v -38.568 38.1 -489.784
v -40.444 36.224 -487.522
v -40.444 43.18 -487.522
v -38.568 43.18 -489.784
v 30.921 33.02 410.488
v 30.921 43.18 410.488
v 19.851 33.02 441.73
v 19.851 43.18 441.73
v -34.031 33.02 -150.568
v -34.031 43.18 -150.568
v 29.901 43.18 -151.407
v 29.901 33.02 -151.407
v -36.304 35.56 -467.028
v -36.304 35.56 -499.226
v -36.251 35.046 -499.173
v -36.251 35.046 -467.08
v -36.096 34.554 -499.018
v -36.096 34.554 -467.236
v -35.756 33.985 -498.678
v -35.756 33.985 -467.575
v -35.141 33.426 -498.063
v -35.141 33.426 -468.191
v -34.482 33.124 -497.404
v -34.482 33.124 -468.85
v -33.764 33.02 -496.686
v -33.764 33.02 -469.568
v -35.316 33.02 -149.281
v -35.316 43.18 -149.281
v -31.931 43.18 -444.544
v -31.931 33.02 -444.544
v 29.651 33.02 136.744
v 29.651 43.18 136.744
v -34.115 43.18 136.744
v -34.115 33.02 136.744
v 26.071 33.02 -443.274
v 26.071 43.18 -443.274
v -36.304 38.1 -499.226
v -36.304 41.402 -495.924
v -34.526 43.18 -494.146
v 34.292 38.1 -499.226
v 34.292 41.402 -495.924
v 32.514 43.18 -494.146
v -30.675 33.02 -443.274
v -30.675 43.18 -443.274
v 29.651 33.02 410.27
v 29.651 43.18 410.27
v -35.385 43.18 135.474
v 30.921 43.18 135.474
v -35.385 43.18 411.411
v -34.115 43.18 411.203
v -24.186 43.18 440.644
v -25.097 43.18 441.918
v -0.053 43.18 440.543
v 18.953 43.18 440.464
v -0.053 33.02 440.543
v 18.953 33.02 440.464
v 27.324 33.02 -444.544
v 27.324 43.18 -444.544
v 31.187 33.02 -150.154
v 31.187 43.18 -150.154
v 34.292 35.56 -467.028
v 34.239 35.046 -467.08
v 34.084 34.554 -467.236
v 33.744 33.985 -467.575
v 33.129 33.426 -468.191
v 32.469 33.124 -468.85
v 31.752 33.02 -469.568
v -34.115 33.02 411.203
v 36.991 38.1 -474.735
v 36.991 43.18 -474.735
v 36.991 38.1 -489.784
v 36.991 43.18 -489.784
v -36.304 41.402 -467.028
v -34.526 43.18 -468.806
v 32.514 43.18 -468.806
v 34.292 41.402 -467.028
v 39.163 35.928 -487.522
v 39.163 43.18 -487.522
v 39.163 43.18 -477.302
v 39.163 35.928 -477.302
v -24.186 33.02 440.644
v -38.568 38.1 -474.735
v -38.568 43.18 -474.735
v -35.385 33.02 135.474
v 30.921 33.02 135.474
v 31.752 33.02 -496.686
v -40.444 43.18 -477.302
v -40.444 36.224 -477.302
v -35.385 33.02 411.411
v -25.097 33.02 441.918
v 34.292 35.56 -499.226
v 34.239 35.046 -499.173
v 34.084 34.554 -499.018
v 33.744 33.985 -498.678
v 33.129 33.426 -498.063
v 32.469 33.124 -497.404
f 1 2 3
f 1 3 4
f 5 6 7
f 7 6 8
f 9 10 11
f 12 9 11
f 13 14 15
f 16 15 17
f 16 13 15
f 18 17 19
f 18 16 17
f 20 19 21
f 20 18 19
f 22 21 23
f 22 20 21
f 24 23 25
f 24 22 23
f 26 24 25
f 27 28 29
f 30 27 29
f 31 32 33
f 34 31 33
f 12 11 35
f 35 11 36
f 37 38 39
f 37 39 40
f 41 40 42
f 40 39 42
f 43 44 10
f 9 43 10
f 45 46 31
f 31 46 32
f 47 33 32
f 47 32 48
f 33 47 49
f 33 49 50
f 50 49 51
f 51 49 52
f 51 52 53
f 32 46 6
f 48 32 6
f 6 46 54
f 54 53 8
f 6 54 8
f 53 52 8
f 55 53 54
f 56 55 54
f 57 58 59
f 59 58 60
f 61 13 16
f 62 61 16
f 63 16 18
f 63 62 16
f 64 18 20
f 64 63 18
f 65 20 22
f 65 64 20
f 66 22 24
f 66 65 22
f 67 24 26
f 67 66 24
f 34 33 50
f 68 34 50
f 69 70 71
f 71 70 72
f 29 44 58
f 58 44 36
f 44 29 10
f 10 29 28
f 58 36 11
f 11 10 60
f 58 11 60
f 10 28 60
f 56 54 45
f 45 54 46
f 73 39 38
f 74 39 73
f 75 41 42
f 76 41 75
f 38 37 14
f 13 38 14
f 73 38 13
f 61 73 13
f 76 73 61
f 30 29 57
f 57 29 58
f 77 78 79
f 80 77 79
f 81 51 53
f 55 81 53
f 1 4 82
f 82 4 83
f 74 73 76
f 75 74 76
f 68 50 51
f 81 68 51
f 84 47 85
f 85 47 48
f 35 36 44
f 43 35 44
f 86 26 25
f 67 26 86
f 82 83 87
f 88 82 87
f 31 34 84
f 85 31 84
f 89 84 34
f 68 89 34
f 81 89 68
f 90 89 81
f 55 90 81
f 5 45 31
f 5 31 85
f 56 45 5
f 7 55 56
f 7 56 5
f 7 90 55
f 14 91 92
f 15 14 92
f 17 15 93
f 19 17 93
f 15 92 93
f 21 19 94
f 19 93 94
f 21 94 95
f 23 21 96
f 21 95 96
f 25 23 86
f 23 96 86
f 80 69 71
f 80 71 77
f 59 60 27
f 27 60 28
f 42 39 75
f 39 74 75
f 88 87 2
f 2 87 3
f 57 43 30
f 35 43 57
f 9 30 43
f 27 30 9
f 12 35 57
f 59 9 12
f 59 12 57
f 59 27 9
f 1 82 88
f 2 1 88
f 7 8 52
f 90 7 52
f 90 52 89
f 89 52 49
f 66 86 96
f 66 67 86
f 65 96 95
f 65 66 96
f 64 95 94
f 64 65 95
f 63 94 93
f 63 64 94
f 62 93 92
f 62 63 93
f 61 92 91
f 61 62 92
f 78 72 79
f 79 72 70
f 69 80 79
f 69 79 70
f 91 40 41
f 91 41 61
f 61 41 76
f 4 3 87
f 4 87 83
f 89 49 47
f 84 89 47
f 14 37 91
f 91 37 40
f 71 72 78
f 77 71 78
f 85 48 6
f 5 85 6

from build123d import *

# Parameters (mm, degrees)
F3_DEPTH       = 10.16
F5_DEPTH       = 10.16
F6_DEPTH       = 3.048
F7_W           = 70.5953985453
F7_H           = 32.1978032589
F8_DEPTH       = 10.16
F9_SIZE        = 5.08
F10_SIZE       = 1.778
F11_R          = 2.54
F12_T1_DEPTH   = 41.1774884869
F12_2_T1_DEPTH = 41.1774884869


# Not quite as in the source:
# - a fillet or chamfer that OpenCascade refuses, or shapes differently, is made with other operations: its cross-section is extruded or revolved along the edge and cut away or added


with BuildPart() as f3:
    # F2 (on offset) → F3 (new body)
    with BuildSketch(Plane.XZ.offset(-43.18)):
        Polygon((-35.3846980661, 135.4740036093), (30.9212480387, 135.4740036093), (30.9212480387, 410.4879885195), (19.851437657, 441.7302218888), (-0.0477681745, 441.8133852342), (-25.0969552653, 441.9180715325), (-35.3846980661, 411.4112124139), align=None)
        Polygon((29.6512480387, 410.2696444457), (29.6512480387, 136.7440036093), (-34.1146980661, 136.7440036093), (-34.1146980661, 411.2028378599), (-24.1862514864, 440.6442544017), (-0.0530757494, 440.5433963249), (18.9527356185, 440.46396668), align=None, mode=Mode.SUBTRACT)
    extrude(amount=F3_DEPTH)

    # F2 (on offset) → F6 (join)
    with BuildSketch(Plane.XZ.offset(-43.18)):
        Polygon((-35.3846980661, 135.4740036093), (30.9212480387, 135.4740036093), (30.9212480387, 410.4879885195), (19.851437657, 441.7302218888), (-0.0477681745, 441.8133852342), (-25.0969552653, 441.9180715325), (-35.3846980661, 411.4112124139), align=None)
        Polygon((29.6512480387, 410.2696444457), (29.6512480387, 136.7440036093), (-34.1146980661, 136.7440036093), (-34.1146980661, 411.2028378599), (-24.1862514864, 440.6442544017), (-0.0530757494, 440.5433963249), (18.9527356185, 440.46396668), align=None, mode=Mode.SUBTRACT)
    extrude(amount=F6_DEPTH)


with BuildPart() as f5:
    # F4 (on offset) → F5 (new body)
    with BuildSketch(Plane.XZ.offset(-43.18)):
        Polygon((27.3243936069, -444.5440577507), (31.1871017119, -150.1536065675), (-35.3159089358, -149.281018081), (-31.9307609946, -444.5440577507), (0.0040204088, -444.5440577507), align=None)
        Polygon((0.0040204088, -443.2740577507), (-30.6752378969, -443.2740577507), (-34.0310705739, -150.567985811), (29.9005487372, -151.4068349758), (26.0709480064, -443.2740577507), align=None, mode=Mode.SUBTRACT)
    extrude(amount=F5_DEPTH)


with BuildPart() as f8:
    # F7 (on offset) → F8 (new body)
    with BuildSketch(Plane.XZ.offset(-43.18)):
        with Locations((-1.0061189532, -483.1268042326)):
            Rectangle(F7_W, F7_H)
    extrude(amount=F8_DEPTH)

    # F9
    f9_edges = [f8.edges().sort_by_distance(p)[0] for p in [
        (-1.006119, 43.18, -499.225706),
    ]]
    chamfer(f9_edges, length=F9_SIZE)

    # F10
    f10_edges = [f8.edges().sort_by_distance(p)[0] for p in [
        (34.29158, 43.18, -480.586804),
        (-1.006119, 43.18, -467.027903),
        (-36.303818, 43.18, -480.586804),
    ]]
    chamfer(f10_edges, length=F10_SIZE)

    # F11
    f11_edges = [f8.edges().sort_by_distance(p)[0] for p in [
        (-1.006119, 33.02, -467.027903),
        (-36.303818, 33.02, -483.126804),
        (-1.006119, 33.02, -499.225706),
        (34.29158, 33.02, -483.126804),
    ]]
    fillet(f11_edges, radius=F11_R)


with BuildPart() as f8b:
    # F7 (on offset) → F8, piece 2 (new body)
    with BuildSketch(Plane.XZ.offset(-43.18)):
        Polygon((-38.5682731867, -489.7837042809), (-38.5682731867, -474.7345149517), (-40.443841368, -477.3021042347), (-40.443841368, -487.5218868256), align=None)
    extrude(amount=F8_DEPTH)

    # F12#2: chamfer of 5.08 on 1 edges, made by hand

    # F12_2_s2 → F12_2_t1 (cut)
    with BuildSketch(Plane.XY.offset(-502.8478538597)):
        Polygon((-38.5682731867, 38.1), (-43.6482731867, 33.02), (-38.5682731867, 33.02), align=None)
    extrude(amount=F12_2_T1_DEPTH, mode=Mode.SUBTRACT)


with BuildPart() as f8c:
    # F7 (on offset) → F8, piece 3 (new body)
    with BuildSketch(Plane.XZ.offset(-43.18)):
        Polygon((36.9912497699, -474.7345149517), (36.9912497699, -489.7837042809), (39.1628630459, -487.5218868256), (39.1628630459, -477.3021042347), align=None)
    extrude(amount=F8_DEPTH)

    # F12: chamfer of 5.08 on 1 edges, made by hand

    # F12_s2 → F12_t1 (cut)
    with BuildSketch(Plane.XY.offset(-502.8478538597)):
        Polygon((36.9912497699, 38.1), (42.0712497699, 33.02), (36.9912497699, 33.02), align=None)
    extrude(amount=F12_T1_DEPTH, mode=Mode.SUBTRACT)


solid = Compound([f3.part, f5.part, f8.part, f8b.part, f8c.part])
